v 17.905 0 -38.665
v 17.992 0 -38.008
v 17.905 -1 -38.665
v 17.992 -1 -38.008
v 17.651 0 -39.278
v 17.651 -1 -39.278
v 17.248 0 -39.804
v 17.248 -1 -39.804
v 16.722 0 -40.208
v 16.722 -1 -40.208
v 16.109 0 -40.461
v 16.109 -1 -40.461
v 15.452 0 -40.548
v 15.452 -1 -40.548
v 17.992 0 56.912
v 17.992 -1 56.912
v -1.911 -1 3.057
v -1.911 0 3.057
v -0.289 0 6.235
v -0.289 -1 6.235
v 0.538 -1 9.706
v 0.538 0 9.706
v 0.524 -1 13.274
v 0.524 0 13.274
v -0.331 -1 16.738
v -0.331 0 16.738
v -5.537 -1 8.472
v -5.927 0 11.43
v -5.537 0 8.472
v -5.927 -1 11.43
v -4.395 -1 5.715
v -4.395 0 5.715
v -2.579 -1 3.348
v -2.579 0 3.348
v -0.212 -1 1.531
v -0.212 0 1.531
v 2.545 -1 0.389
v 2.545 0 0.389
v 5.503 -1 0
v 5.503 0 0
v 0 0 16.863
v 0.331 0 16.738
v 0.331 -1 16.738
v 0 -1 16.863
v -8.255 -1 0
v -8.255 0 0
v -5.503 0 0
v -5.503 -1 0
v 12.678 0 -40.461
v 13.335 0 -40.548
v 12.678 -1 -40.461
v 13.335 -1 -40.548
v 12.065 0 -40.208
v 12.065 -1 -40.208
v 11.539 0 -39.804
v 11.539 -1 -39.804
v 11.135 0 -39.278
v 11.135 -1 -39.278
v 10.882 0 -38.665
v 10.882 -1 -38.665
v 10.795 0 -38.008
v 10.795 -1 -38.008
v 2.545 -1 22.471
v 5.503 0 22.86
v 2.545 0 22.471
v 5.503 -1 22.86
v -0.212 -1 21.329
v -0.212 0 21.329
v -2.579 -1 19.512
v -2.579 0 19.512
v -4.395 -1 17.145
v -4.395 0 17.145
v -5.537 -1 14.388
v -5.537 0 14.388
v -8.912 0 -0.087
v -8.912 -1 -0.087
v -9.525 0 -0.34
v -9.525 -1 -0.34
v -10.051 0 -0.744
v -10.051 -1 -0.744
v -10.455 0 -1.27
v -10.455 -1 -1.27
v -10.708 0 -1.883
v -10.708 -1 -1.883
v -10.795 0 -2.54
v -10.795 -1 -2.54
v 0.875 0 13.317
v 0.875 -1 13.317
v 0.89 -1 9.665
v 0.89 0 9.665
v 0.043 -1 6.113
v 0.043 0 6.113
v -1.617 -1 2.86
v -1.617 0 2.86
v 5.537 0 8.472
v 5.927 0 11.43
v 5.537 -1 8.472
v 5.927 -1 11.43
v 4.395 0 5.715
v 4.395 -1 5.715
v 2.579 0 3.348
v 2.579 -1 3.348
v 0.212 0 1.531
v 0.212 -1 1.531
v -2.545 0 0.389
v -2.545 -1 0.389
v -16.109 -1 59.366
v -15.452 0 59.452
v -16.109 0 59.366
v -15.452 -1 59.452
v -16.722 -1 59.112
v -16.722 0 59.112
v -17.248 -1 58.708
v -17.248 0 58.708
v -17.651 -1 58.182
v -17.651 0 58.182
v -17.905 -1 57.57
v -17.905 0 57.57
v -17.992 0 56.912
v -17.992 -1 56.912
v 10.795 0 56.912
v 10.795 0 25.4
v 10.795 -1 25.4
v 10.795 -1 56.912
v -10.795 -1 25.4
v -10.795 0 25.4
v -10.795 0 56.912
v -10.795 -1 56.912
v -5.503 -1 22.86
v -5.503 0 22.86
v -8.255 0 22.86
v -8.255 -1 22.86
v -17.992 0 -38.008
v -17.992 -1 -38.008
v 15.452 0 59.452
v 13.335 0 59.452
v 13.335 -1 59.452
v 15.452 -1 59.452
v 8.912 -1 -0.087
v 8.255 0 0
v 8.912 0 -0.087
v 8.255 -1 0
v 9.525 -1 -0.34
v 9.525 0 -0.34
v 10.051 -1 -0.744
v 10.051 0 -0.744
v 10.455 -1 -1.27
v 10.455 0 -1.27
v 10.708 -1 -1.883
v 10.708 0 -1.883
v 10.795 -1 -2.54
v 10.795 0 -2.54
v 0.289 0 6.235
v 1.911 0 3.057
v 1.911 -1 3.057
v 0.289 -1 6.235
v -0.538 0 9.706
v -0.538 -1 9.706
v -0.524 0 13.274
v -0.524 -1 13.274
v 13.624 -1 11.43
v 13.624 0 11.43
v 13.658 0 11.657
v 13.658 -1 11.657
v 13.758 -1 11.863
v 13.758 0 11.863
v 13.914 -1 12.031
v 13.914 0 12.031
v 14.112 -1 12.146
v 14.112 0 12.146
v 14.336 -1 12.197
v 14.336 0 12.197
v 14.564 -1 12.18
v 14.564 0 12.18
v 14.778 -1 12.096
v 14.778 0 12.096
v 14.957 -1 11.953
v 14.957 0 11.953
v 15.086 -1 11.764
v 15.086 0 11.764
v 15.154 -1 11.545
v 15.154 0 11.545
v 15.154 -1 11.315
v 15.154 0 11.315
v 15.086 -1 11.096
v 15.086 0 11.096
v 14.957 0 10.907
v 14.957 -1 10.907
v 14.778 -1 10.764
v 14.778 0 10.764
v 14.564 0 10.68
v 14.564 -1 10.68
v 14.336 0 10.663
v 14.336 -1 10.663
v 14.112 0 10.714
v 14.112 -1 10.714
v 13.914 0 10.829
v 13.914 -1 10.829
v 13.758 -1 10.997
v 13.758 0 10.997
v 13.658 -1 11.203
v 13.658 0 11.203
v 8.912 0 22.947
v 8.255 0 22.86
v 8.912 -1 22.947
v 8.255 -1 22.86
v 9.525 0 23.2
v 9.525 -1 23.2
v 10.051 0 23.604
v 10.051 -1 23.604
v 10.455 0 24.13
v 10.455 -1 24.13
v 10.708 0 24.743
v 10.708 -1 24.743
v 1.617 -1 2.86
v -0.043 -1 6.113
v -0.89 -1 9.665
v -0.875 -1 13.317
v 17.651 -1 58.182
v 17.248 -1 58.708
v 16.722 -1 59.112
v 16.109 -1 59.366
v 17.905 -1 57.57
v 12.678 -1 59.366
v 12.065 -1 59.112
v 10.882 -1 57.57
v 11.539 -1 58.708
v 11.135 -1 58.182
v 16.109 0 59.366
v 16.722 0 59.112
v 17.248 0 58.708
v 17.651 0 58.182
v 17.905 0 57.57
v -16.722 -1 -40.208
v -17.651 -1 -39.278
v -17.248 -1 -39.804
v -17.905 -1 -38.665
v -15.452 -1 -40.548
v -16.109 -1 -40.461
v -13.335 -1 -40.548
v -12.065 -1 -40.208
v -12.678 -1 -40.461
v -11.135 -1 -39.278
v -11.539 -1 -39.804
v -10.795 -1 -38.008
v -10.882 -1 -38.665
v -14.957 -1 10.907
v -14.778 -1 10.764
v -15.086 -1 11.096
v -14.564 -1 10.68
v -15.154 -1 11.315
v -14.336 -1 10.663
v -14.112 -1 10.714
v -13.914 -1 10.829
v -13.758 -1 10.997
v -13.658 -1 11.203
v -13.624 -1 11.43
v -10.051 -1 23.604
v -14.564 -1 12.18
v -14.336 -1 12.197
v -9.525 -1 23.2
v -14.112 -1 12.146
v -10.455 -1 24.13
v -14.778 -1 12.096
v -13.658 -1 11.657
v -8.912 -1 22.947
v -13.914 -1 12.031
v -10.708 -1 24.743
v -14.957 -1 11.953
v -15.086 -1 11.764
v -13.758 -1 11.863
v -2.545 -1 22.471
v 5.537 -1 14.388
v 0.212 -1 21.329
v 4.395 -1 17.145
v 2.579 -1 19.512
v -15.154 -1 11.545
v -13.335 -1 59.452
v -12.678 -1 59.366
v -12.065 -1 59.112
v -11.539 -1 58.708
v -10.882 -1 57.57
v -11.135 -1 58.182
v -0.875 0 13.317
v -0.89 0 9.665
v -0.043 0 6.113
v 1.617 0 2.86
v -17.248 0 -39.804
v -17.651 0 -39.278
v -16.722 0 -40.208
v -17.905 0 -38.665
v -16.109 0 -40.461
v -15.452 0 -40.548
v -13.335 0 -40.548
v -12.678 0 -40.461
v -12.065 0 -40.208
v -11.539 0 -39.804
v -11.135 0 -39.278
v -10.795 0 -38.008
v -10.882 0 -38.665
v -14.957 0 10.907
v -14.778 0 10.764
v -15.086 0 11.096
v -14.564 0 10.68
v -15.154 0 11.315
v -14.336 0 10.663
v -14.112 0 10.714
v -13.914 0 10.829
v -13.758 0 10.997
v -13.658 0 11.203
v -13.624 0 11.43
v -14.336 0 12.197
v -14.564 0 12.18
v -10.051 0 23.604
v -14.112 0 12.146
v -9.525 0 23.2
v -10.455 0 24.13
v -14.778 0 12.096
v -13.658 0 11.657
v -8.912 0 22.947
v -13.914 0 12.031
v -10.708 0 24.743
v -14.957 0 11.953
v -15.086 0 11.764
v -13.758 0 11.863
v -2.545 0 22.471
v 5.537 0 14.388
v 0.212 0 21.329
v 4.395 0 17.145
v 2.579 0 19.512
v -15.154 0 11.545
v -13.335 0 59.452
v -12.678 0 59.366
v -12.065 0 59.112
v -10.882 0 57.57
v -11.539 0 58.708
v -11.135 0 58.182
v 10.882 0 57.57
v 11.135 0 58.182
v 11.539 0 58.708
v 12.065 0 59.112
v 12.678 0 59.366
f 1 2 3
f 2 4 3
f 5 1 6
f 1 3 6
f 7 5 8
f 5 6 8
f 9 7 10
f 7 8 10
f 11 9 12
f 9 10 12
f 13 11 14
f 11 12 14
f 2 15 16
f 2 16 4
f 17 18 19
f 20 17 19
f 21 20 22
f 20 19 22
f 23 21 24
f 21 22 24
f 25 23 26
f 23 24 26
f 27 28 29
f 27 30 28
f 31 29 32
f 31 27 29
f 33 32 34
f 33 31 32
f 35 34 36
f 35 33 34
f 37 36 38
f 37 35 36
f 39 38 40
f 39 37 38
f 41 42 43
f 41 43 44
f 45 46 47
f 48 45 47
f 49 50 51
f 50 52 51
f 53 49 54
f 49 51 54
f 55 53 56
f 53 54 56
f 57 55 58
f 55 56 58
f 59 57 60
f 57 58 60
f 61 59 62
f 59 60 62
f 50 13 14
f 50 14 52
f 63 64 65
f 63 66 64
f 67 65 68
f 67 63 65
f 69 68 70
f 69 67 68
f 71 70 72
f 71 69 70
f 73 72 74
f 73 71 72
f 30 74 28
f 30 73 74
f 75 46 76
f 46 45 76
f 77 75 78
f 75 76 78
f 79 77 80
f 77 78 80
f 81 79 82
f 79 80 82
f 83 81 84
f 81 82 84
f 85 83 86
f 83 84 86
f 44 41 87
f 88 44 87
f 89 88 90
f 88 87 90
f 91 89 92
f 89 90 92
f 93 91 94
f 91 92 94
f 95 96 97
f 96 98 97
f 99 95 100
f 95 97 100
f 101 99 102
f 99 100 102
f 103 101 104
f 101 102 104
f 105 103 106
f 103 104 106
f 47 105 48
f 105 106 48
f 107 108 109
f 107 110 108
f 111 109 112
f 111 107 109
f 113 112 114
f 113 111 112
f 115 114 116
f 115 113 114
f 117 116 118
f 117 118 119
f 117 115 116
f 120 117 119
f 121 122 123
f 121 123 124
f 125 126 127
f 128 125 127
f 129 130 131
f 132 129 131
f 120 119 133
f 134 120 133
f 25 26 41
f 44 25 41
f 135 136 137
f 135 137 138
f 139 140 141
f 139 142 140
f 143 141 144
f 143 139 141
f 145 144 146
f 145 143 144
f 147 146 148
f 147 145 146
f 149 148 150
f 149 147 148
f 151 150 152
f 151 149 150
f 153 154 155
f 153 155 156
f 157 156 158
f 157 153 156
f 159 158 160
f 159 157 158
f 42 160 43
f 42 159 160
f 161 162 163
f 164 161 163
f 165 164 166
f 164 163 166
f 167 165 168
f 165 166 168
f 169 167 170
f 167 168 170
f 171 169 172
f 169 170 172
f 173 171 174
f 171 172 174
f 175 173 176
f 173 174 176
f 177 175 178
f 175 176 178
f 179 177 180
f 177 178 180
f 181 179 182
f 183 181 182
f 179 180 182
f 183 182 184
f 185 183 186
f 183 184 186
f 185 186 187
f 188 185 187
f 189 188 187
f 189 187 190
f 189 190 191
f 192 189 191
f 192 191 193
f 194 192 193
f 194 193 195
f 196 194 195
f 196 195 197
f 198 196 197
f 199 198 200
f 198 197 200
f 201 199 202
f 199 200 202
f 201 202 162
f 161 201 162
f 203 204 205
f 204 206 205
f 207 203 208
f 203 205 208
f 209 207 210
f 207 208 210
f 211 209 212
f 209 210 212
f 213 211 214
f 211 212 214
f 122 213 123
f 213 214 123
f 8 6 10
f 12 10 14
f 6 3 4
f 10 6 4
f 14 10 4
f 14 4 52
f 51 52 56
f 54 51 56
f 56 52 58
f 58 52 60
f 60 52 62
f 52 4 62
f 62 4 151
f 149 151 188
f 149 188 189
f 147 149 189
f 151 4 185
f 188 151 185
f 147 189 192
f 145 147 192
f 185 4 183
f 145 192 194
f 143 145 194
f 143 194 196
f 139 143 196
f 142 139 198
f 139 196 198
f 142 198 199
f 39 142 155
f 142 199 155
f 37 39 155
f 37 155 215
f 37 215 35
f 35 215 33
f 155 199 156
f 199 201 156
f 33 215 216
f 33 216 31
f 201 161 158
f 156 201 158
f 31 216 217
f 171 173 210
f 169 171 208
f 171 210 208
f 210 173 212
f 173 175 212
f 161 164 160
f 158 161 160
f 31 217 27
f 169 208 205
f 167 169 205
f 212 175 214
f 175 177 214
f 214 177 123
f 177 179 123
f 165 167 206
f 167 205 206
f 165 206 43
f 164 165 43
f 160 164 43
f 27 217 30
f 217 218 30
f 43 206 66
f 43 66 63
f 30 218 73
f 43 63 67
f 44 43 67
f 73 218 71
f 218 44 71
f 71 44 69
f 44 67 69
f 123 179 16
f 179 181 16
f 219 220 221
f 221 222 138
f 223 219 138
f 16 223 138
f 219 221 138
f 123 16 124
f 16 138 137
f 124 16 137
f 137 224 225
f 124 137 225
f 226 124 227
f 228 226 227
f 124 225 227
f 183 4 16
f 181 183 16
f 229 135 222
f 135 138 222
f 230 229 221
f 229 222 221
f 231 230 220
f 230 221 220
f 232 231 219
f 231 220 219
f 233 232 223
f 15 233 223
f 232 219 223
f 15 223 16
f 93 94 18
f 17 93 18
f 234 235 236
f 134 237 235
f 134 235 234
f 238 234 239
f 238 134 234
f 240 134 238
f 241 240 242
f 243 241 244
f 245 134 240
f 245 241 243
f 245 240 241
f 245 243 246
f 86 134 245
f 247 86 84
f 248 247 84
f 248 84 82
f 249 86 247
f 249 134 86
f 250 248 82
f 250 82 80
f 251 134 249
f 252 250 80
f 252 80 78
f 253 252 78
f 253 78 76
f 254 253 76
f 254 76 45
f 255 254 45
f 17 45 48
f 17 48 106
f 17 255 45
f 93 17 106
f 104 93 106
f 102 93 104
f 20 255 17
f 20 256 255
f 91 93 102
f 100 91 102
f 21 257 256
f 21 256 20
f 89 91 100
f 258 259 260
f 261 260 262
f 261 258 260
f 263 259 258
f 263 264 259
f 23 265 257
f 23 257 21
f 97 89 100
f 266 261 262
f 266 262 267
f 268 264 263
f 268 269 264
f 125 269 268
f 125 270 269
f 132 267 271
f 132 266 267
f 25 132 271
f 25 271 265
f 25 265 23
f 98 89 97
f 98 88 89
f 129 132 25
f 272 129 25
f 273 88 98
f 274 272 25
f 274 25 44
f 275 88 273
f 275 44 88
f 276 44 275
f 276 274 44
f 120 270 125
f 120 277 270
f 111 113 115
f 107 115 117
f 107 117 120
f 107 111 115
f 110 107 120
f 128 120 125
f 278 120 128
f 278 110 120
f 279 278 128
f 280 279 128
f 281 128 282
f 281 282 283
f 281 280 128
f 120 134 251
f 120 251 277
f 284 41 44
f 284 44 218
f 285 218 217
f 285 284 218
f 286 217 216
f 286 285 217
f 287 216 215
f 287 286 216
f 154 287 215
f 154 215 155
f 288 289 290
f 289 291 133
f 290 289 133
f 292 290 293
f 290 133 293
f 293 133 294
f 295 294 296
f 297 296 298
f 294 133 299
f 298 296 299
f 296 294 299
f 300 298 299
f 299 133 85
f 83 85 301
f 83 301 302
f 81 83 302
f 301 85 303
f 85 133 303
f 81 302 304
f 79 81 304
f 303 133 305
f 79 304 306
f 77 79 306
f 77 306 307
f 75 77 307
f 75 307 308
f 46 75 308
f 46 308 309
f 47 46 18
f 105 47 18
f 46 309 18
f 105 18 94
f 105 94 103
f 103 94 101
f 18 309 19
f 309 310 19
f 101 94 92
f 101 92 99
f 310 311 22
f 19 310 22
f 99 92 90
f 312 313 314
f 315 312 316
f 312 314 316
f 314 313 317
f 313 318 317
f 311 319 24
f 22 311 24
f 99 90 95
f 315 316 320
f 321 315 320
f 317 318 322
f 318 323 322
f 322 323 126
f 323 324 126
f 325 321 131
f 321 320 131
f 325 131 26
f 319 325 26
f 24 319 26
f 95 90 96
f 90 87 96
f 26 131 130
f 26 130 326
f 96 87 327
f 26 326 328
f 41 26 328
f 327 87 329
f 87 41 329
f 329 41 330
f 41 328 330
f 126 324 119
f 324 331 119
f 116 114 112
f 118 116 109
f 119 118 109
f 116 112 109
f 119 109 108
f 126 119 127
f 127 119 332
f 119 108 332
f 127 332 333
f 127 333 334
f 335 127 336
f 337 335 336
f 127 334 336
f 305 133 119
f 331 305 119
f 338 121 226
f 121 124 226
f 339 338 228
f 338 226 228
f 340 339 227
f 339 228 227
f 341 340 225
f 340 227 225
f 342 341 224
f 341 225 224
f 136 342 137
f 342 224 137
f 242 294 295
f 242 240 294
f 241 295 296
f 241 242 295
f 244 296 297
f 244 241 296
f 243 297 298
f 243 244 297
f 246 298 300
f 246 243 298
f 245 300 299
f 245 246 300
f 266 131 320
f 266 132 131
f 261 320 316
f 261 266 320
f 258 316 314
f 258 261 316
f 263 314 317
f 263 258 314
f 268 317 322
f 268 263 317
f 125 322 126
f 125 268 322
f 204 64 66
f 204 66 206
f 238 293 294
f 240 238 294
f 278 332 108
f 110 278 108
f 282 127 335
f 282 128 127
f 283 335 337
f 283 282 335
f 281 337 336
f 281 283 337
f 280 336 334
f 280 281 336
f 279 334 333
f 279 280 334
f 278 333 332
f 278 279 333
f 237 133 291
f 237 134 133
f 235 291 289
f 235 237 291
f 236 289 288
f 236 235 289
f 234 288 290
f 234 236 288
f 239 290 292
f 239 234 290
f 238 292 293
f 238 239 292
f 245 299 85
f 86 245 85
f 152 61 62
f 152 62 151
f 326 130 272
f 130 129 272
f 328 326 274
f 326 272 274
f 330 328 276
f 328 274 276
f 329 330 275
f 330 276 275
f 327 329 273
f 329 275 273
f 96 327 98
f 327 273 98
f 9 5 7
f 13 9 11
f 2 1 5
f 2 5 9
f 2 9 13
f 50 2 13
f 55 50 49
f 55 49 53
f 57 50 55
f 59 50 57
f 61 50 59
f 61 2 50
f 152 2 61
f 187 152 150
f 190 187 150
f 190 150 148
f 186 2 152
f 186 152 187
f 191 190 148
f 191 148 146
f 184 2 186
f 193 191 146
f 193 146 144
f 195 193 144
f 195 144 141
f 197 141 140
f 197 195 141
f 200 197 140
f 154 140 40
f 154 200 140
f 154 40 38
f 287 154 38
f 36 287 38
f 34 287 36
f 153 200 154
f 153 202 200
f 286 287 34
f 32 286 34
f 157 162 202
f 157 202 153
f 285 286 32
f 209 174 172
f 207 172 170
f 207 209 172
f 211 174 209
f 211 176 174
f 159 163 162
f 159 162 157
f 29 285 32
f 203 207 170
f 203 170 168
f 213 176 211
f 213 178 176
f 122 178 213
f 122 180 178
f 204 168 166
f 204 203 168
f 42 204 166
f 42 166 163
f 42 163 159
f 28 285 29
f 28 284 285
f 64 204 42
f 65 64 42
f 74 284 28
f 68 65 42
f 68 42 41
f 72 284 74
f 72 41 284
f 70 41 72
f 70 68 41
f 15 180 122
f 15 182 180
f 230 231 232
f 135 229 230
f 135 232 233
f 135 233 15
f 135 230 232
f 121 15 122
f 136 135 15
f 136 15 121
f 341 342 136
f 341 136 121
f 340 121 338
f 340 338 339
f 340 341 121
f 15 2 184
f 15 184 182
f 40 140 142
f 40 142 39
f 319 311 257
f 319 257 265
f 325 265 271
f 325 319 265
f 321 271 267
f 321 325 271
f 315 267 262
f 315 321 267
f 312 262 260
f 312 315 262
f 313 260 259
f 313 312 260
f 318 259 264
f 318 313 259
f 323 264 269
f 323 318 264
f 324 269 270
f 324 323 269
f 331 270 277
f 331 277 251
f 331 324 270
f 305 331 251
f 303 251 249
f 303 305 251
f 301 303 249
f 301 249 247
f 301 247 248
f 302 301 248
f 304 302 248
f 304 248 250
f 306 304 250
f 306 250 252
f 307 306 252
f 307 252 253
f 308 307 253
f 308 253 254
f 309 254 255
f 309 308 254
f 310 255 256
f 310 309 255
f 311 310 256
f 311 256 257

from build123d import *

# Parameters (mm, degrees)
F0_R     = 0.769031
F1_DEPTH = 1
F2_R     = 11.43
F3_R     = 2.54


with BuildPart() as f1:
    # F0 (on Front) → F1 (new body)
    with BuildSketch(Plane.XZ):
        Polygon((-10.795, 59.452113), (-17.991666, 59.452113), (-17.991666, -40.547887), (-10.795, -40.547887), (-10.795, 0), (5.926669, 0), (5.926669, 22.860002), (-10.795, 22.860002), align=None)
        with Locations((-14.393333, 11.430001)):
            Circle(F0_R, mode=Mode.SUBTRACT)
        with BuildLine():
            Line((-0.331232, 16.737692), (0, 16.862715))
            ThreePointArc((0, 16.862715), (0.88959, 9.665159), (-1.61703, 2.859791))
            Line((-1.61703, 2.859791), (-1.91105, 3.057015))
            ThreePointArc((-1.91105, 3.057015), (0.537887, 9.705773), (-0.331232, 16.737692))
        make_face(mode=Mode.SUBTRACT)
    extrude(amount=F1_DEPTH)

    # F2
    f2_edges = [f1.edges().sort_by_distance(p)[0] for p in [
        (5.926669, -0.5, 0),
        (5.926669, -0.5, 22.860002),
    ]]
    fillet(f2_edges, radius=F2_R)

    # F3
    f3_edges = [f1.edges().sort_by_distance(p)[0] for p in [
        (-10.795, -0.5, -40.547887),
        (-17.991666, -0.5, -40.547887),
        (-10.795, -0.5, 0),
        (-10.795, -0.5, 22.860002),
        (-10.795, -0.5, 59.452113),
        (-17.991666, -0.5, 59.452113),
    ]]
    fillet(f3_edges, radius=F3_R)


with BuildPart() as f4_1:
    # F4: instance of F1
    add(f1.part.mirror(Plane.YZ))


solid = Compound([f1.part, f4_1.part])
